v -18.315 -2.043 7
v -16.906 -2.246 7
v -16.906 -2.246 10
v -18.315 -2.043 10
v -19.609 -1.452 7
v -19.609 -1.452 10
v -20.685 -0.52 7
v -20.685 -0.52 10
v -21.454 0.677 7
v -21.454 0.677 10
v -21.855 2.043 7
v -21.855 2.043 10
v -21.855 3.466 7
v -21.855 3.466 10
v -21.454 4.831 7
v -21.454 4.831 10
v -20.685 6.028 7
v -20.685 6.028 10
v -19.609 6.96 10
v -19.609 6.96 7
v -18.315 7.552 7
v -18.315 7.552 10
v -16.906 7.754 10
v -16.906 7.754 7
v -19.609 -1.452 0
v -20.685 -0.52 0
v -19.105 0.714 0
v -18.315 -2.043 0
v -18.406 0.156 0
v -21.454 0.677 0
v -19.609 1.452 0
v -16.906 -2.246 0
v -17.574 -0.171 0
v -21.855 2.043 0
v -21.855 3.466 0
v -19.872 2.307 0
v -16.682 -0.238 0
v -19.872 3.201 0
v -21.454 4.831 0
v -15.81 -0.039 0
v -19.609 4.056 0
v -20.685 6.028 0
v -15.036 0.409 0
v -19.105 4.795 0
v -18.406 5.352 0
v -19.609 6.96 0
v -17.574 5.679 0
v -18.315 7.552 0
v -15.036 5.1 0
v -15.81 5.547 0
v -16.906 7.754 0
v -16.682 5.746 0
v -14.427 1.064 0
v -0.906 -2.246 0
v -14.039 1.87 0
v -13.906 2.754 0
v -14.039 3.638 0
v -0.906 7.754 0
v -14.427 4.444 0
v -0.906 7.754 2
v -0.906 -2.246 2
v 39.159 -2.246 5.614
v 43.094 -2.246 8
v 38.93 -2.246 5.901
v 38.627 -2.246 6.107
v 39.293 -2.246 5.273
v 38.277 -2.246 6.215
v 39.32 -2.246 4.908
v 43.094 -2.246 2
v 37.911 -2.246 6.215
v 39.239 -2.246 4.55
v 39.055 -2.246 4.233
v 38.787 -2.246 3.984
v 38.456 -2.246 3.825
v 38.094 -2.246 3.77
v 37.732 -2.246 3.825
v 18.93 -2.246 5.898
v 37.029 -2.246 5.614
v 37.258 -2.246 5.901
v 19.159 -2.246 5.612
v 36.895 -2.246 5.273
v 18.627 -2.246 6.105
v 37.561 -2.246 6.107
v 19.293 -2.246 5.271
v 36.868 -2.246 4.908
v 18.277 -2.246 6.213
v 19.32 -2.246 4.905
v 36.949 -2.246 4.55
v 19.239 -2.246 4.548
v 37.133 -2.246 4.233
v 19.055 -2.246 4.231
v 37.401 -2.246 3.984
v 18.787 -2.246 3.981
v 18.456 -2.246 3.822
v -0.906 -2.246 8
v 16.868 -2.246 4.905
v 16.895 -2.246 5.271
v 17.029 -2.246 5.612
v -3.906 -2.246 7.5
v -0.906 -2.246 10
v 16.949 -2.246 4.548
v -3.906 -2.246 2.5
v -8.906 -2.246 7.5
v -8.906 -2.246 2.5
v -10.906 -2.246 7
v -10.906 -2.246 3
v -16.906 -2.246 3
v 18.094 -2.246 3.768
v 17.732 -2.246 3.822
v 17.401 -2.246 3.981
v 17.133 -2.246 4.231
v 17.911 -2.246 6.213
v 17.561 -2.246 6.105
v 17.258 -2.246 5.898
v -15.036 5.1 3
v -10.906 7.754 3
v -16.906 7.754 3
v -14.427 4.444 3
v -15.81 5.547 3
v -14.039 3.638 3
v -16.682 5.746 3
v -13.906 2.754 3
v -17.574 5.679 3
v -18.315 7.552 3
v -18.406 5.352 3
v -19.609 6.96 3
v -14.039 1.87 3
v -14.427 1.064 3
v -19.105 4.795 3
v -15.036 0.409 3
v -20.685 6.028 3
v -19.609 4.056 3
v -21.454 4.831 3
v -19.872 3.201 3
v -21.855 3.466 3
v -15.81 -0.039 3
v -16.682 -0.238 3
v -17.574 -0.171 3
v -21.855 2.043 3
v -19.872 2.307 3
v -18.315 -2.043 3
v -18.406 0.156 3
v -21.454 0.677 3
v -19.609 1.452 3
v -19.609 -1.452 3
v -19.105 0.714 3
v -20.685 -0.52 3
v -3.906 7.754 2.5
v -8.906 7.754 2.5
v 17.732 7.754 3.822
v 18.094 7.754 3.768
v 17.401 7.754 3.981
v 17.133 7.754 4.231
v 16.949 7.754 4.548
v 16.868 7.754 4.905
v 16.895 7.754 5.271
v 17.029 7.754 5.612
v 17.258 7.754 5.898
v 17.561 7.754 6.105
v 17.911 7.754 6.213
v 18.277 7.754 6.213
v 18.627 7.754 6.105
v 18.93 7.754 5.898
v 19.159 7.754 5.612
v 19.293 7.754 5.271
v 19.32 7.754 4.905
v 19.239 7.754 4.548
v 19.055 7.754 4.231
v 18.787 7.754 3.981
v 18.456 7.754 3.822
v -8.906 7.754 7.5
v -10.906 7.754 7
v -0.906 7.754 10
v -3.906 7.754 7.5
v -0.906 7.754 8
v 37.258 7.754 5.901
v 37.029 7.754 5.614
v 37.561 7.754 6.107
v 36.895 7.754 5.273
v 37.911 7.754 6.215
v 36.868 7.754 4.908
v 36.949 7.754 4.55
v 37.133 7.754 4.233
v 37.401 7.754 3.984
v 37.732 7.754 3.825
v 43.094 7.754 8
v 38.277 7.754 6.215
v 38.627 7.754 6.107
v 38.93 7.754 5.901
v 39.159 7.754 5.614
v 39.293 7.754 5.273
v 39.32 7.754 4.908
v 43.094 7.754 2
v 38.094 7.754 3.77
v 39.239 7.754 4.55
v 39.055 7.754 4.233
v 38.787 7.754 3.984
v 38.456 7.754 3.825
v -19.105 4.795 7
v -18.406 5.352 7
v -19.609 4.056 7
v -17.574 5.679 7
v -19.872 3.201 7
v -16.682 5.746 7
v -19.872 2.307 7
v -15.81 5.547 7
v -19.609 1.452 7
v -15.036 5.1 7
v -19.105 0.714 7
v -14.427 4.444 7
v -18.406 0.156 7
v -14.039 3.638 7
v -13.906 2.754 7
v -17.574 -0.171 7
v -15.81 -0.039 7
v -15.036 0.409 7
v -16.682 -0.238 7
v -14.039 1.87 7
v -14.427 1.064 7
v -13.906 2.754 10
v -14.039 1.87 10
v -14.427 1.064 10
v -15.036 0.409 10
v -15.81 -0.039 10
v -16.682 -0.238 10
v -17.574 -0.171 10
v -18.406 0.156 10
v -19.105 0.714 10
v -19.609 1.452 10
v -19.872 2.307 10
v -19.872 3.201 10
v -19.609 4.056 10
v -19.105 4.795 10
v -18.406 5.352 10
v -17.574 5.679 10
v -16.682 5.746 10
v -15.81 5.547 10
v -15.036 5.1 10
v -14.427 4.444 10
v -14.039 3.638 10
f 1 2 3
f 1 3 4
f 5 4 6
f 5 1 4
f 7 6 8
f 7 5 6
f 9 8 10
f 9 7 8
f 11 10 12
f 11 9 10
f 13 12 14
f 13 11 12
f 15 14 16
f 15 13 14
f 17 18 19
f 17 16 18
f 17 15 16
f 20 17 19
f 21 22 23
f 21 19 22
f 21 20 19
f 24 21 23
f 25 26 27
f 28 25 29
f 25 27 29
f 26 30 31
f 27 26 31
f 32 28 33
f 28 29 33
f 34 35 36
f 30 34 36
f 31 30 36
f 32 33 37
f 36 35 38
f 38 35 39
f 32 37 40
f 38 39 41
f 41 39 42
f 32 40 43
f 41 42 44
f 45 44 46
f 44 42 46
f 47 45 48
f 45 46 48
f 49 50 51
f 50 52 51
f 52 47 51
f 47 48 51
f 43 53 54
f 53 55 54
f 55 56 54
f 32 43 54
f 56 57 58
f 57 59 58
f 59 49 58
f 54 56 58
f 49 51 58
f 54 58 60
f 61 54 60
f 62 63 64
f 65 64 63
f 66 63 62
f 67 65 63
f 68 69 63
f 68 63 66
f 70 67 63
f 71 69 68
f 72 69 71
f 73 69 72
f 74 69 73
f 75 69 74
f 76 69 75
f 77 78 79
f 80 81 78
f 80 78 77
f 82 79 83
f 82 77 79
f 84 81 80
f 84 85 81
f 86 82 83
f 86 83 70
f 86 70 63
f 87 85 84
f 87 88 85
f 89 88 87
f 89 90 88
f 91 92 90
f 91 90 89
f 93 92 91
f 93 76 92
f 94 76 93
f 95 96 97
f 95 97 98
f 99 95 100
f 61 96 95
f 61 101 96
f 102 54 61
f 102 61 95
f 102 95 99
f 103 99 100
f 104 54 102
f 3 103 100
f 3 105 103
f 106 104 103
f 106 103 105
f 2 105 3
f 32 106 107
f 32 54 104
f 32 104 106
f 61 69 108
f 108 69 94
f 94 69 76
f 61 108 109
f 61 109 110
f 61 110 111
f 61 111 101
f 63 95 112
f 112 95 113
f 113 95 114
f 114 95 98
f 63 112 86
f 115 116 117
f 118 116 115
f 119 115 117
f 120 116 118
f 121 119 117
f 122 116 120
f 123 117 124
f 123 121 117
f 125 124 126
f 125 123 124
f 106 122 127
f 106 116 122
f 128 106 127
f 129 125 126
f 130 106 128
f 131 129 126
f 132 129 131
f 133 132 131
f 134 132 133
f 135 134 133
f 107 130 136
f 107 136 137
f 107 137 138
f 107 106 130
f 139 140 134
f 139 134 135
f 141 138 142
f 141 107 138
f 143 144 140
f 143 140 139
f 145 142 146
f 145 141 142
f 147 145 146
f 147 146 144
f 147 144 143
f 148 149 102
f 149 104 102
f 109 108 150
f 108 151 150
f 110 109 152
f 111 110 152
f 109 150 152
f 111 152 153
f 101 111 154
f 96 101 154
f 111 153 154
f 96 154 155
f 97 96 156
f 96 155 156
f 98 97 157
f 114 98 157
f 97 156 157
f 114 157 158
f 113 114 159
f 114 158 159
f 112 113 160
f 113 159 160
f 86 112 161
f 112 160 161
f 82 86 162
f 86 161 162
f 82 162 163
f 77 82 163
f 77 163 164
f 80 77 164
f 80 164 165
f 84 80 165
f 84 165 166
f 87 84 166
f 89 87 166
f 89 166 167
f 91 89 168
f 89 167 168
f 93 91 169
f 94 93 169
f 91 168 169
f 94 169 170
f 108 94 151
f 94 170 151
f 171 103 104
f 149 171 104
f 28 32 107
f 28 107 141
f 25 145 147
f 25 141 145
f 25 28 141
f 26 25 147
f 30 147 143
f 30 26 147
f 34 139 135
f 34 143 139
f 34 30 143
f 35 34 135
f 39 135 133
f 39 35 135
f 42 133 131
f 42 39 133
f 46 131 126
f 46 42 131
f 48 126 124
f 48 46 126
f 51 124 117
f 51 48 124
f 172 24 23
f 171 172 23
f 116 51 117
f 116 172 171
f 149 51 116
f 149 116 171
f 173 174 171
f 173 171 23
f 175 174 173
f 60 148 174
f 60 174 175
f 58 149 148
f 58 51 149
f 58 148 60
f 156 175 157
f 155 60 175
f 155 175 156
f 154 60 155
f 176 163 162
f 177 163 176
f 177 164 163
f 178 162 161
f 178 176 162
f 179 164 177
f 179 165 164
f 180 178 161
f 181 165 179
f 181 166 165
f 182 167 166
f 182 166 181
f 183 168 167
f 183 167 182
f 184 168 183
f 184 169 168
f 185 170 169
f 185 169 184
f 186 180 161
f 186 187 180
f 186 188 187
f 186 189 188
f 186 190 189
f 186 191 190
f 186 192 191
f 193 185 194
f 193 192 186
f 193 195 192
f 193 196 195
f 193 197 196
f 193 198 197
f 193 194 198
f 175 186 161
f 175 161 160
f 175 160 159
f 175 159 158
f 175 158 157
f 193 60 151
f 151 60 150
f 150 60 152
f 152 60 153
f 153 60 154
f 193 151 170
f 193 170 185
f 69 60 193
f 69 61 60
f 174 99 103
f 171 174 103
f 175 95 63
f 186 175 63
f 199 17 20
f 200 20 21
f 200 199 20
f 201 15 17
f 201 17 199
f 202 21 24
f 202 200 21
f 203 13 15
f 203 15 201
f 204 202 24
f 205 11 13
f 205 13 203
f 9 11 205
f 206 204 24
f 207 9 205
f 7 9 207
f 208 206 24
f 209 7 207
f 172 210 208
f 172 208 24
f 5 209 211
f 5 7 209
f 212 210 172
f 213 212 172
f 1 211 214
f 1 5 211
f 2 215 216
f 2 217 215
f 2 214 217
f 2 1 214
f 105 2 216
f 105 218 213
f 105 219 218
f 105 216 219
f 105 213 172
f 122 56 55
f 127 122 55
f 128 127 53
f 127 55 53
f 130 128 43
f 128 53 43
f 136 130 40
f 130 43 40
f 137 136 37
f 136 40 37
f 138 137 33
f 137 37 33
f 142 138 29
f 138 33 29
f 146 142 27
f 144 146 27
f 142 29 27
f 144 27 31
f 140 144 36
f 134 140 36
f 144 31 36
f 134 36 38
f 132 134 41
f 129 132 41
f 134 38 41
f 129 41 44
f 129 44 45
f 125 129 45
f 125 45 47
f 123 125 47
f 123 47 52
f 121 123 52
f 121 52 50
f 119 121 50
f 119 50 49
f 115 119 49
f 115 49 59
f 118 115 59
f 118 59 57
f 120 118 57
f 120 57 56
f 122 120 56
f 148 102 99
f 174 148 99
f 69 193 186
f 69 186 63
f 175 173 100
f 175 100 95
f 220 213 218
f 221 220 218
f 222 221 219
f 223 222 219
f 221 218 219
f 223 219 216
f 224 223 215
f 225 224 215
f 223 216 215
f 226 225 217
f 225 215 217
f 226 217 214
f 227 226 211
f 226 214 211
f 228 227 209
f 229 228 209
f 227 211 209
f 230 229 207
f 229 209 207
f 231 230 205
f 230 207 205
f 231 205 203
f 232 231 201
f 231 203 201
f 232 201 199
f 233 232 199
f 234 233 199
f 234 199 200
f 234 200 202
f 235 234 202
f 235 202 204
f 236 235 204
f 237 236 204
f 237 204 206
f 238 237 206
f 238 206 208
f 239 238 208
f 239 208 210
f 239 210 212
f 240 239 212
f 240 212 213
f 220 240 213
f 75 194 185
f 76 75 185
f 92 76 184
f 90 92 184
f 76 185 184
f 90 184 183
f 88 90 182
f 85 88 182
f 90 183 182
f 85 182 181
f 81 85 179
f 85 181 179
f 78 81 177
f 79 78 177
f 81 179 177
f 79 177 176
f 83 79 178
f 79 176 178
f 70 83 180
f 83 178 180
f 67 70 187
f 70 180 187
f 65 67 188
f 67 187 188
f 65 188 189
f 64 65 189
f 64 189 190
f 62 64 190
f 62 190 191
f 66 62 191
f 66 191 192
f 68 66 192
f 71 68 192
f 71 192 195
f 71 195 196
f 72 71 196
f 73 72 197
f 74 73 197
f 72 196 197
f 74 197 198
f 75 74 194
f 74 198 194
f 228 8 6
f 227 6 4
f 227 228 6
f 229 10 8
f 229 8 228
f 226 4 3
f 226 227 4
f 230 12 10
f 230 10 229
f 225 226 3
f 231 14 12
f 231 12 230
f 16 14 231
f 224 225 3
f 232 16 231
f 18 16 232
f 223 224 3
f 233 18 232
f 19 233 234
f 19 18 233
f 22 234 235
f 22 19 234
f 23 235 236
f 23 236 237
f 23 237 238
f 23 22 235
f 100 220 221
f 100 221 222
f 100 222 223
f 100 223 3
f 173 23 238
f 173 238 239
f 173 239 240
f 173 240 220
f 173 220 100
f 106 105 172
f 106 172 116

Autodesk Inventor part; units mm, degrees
ref_plane "YZ Plane" through (0, 0, 0) normal (1, 0, 0) x (0, 1, 0)
ref_plane "XZ Plane" through (0, 0, 0) normal (0, 1, 0) x (-1, 0, 0)
ref_plane "XY Plane" through (0, 0, 0) normal (0, 0, 1) x (1, 0, 0)
sketch "Szkic1" plane through (0, 0, 0) normal (0, 0, 1) x (1, 0, 0)
  line L0 (-16.906, 7.7541) -> (43.094, 7.7541)
  line L1 (43.094, 7.7541) -> (43.094, -2.2459)
  line L2 (43.094, -2.2459) -> (-16.906, -2.2459)
  line L3 (-16.906, -2.2459) -> (-16.906, 7.7541)
  arc A0 (-16.906, 7.7541) -> (-16.906, -2.2459) centre (-16.906, 2.7541) ccw
  circle A1 centre (-16.906, 2.7541) radius 3
  point P0 (0, 0)
  dimension "d0" = 60
  dimension "d1" = 10
  dimension "d2" = 6
extrude "Wyciągnięcie proste1" add sketch "Szkic1" along normal blind 10 contours L0 L1 L2 L3 A1 | L3 A1 A0
sketch "Szkic2" plane through (-16.906, -2.2459, 0) normal (0, -1, 0) x (1, 0, 0)
  line L0 (0, 0) -> (0, 10) projected
  line L1 (0, 5) -> (-8.6821, 5)
  line L2 (-8.6821, 5) -> (9.8833, 5)
  line L3 (-5, 0) -> (-5, 10) projected
  line L4 (-5, 7) -> (6, 7)
  line L5 (6, 7) -> (6, 3)
  line L6 (6, 3) -> (-5, 3)
  line L7 (-5, 3) -> (-5, 7)
  point P0 (16.906, 0)
  dimension "d5" = 11
  dimension "d6" = 4
extrude "Wyciągnięcie proste2" cut sketch "Szkic2" against normal blind 10
sketch "Szkic3" plane through (-16.906, -2.2459, 0) normal (0, -1, 0) x (1, 0, 0)
  line L0 (0, 10) -> (60, 10) projected
  line L1 (8, 10) -> (8, 0)
  line L2 (6, 7) -> (6, 3) projected
  line L3 (13, 7.5) -> (8, 7.5)
  line L4 (8, 7.5) -> (8, 2.5)
  line L5 (8, 2.5) -> (13, 2.5)
  line L6 (13, 2.5) -> (13, 7.5)
  line L7 (6, 5) -> (16.5434, 5)
  point P0 (16.906, 0)
  dimension "d9" = 2
  dimension "d10" = 5
  dimension "d11" = 5
extrude "Wyciągnięcie proste3" cut sketch "Szkic3" against normal blind 10
sketch "Szkic4" plane through (-16.906, -2.2459, 0) normal (0, -1, 0) x (1, 0, 0)
  line L0 (60, 0) -> (60, 10) projected
  line L1 (60, 10) -> (16, 10)
  line L2 (16, 10) -> (16, 8)
  line L3 (16, 8) -> (60, 8)
  line L4 (60, 8) -> (60, 10)
  line L5 (60, 0) -> (0, 0) projected
  line L6 (60, 0) -> (16, 0)
  line L7 (16, 0) -> (16, 2)
  line L8 (16, 2) -> (60, 2)
  line L9 (60, 2) -> (60, 0)
  point P0 (16.906, 0)
  point P1 (16, 0)
  dimension "d14" = 44
  dimension "d15" = 2
  dimension "d16" = 44
  dimension "d17" = 2
extrude "Wyciągnięcie proste4" cut sketch "Szkic4" against normal blind 10
sketch "Szkic5" plane through (-16.906, -2.2459, 7) normal (0, -1, 0) x (1, 0, 0)
  line L0 (16, 1) -> (60, 1) projected
  line L1 (30, 1) -> (30, -5.0068)
  line L2 (60, -5) -> (60, 1) projected
  line L3 (55, 1) -> (55, -5)
  line L4 (35, 1) -> (35, -5)
  line L5 (60, -5) -> (16, -5) projected
  line L6 (60, -2) -> (30, -2.0034)
  point P0 (16.906, -7)
  point P1 (55, -2.0006)
  point P2 (35, -2.0028)
  dimension "d20" = 30
  dimension "d21" = 5
  dimension "d22" = 25
hole "Otwór1" at (38.094, -2.2459, 4.9994) at (18.094, -2.2459, 4.9972) direction (0, 1, 0) diameter 2.459 end through all thread size "M3x0.5" class "6H" standard "ISO Metric profile"
properties part number "ramie" material "Stal nierdzewna 440C"
